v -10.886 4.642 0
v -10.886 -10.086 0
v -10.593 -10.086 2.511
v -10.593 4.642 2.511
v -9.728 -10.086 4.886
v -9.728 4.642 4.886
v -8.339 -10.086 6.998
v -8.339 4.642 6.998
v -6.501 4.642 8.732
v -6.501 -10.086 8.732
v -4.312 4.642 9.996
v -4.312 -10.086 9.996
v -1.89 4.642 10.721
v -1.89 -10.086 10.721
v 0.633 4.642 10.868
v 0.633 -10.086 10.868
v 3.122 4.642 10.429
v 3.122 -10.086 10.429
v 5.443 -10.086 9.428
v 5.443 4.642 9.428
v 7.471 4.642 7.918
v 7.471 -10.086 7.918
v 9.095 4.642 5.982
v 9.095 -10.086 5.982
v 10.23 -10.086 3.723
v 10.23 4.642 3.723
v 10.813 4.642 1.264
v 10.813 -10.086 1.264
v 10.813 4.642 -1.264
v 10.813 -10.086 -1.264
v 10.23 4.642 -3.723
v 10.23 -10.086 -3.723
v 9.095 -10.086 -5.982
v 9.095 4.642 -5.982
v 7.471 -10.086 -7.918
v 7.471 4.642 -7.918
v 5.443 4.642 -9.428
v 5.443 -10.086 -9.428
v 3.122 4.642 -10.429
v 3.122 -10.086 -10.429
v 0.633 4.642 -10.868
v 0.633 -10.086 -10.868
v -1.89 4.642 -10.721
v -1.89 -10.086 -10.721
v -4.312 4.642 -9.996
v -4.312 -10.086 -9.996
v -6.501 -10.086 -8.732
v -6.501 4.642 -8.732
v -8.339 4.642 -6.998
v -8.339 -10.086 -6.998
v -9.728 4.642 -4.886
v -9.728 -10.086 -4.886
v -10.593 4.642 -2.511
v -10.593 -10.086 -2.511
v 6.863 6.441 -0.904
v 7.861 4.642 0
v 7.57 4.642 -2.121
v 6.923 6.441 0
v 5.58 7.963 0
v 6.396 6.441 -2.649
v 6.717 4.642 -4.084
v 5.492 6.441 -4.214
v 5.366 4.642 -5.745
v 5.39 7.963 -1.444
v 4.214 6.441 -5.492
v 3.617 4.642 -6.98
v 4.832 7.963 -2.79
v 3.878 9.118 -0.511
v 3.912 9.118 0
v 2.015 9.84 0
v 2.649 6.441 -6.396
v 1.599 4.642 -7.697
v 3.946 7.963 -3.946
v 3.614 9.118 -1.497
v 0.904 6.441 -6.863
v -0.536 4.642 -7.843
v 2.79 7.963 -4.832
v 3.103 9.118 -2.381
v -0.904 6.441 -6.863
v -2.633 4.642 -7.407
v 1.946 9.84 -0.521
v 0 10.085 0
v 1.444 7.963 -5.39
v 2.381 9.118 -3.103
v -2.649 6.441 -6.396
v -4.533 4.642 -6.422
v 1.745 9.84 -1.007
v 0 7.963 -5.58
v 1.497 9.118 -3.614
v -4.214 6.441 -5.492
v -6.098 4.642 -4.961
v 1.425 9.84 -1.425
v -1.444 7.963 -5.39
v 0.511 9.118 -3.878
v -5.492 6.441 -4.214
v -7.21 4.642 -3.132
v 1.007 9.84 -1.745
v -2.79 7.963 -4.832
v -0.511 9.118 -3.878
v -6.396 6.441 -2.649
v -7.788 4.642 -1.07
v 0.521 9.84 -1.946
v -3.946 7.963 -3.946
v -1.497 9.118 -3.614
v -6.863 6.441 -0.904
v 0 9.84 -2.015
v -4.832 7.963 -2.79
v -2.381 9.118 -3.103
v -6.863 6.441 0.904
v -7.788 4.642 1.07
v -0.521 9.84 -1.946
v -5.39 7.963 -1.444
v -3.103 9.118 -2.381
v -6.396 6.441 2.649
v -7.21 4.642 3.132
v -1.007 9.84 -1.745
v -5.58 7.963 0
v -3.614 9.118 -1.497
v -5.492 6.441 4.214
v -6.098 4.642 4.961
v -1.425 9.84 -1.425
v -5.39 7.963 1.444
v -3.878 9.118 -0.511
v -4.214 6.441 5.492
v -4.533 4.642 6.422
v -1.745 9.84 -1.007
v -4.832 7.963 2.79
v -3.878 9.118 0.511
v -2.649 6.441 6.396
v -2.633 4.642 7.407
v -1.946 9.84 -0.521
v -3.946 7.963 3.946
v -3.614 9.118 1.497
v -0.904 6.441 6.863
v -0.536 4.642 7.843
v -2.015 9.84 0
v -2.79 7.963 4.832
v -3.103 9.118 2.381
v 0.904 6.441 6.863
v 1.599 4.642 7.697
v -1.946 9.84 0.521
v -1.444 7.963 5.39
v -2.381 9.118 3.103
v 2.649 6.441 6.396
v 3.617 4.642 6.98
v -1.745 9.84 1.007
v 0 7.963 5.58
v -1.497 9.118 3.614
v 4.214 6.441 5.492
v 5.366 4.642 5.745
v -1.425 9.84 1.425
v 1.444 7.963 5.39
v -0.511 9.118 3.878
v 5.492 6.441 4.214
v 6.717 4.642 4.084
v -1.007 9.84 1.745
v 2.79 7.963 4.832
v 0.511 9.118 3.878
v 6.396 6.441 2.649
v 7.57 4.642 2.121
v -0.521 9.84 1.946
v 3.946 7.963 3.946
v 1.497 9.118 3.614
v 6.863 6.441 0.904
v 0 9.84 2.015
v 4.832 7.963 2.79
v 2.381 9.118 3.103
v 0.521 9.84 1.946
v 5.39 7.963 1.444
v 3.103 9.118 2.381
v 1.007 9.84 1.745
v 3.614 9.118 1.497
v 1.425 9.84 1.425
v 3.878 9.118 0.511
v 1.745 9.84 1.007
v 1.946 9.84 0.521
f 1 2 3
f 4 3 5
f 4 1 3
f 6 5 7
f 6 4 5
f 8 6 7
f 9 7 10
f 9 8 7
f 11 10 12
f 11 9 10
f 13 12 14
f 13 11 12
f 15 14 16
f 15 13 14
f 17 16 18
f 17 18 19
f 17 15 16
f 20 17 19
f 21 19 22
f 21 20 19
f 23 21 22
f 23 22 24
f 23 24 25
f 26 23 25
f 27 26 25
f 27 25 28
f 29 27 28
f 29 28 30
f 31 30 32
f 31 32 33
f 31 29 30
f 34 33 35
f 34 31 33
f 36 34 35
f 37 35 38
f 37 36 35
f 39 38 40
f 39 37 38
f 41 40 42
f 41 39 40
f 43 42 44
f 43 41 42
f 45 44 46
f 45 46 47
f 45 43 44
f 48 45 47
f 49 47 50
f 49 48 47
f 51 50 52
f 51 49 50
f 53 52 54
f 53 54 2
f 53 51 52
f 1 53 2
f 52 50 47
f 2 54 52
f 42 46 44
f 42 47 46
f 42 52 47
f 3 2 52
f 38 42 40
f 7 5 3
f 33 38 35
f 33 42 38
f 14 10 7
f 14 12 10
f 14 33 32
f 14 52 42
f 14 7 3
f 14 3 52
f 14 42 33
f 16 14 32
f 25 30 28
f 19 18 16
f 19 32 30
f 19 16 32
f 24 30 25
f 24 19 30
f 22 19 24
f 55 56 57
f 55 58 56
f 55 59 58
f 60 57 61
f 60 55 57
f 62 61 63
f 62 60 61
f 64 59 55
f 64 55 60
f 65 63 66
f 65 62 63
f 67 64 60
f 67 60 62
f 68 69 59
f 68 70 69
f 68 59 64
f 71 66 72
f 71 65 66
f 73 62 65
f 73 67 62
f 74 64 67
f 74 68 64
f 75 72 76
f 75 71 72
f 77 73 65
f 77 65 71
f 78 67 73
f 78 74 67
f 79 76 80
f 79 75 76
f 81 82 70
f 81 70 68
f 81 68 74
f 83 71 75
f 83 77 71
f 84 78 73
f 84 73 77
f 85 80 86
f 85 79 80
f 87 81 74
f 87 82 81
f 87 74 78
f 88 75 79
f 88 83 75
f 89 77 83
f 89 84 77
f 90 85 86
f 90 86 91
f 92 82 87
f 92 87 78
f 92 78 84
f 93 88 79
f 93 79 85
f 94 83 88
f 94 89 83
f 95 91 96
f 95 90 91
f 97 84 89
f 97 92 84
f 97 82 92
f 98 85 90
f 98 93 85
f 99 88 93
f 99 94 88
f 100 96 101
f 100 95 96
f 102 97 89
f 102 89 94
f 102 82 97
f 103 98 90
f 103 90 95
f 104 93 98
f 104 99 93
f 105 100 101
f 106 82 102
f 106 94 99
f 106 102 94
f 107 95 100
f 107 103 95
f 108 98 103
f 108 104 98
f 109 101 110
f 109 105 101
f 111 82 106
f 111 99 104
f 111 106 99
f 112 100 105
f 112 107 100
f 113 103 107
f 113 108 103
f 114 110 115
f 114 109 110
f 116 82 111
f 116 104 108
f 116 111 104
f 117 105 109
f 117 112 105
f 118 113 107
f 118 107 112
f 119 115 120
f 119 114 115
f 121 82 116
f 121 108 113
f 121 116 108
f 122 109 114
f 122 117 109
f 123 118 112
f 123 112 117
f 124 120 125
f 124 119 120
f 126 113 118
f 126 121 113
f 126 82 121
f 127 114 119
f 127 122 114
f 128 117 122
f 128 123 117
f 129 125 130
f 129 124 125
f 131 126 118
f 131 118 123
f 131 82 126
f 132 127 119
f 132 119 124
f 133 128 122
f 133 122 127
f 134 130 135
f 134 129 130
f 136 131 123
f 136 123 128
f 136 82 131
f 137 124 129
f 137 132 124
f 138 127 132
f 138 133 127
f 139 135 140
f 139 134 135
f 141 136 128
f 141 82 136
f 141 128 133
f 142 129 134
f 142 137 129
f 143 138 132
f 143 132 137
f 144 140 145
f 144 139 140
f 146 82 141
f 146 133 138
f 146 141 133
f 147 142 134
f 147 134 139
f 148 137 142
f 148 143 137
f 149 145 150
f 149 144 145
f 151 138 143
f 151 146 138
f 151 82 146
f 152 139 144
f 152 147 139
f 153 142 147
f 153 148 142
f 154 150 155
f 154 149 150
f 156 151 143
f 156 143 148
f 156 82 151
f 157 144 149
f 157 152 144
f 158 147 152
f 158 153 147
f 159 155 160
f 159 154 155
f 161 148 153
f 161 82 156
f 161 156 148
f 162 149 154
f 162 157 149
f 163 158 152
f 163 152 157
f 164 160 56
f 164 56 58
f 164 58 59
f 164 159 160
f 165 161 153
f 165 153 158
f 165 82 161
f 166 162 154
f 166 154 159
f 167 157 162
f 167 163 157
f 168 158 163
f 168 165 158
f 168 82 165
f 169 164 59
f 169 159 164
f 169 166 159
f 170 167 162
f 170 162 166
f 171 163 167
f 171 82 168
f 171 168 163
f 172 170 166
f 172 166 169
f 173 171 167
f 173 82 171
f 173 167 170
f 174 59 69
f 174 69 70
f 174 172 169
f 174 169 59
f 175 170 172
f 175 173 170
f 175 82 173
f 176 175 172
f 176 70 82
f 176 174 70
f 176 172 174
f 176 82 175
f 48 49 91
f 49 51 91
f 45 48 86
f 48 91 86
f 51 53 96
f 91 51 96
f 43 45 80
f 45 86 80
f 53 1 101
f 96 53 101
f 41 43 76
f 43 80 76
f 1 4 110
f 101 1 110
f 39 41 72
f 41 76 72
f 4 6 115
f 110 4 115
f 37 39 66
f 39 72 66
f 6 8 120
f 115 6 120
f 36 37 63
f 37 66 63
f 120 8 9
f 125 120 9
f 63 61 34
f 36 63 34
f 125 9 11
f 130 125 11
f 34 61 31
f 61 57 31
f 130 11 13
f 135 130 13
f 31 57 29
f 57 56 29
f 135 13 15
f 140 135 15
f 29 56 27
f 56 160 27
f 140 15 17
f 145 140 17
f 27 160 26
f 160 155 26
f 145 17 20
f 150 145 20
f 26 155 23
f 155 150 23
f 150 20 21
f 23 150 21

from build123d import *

# Parameters (mm, degrees)
SKETCH_2_W    = 5.6
SKETCH_2_H    = 7.57604586
SCALE_1_SCALE = 2.7
SCALE_2_SCALE = 0.72


with BuildPart() as part:
    # Sketch 1 → 旋转2 (revolve)
    with BuildSketch(Plane.XY):
        with BuildLine():
            Line((0, 4.32), (0, -4.32))
            ThreePointArc((0, -4.32), (4.32, 0), (0, 4.32))
        make_face()
    revolve(axis=Axis((0, 0, 0), (0, 1, 0)))

    # 草图2 → 旋转3 (revolve)
    with BuildSketch(Plane.XY, mode=Mode.PRIVATE) as revolve_3_sk:
        with Locations((2.8, -2.26802293)):
            Rectangle(SKETCH_2_W, SKETCH_2_H)
    revolve(revolve_3_sk.sketch.rotate(Axis((0, -6.05604586, 0), (0, 1, 0)), 180), axis=Axis((0, -6.05604586, 0), (0, 1, 0)))


with BuildPart() as part_1:
    # Масштаб1: scaled about (0, -1.786959448, 0)
    add(part.part.scale(SCALE_1_SCALE).moved(Location((0, 3.037831062, 0))))


with BuildPart() as part_2:
    # Масштаб2: scaled about (0, -1.786959449, 0)
    add(part_1.part.scale(SCALE_2_SCALE).moved(Location((0, -0.500348646, 0))))


solid = part_2.part
